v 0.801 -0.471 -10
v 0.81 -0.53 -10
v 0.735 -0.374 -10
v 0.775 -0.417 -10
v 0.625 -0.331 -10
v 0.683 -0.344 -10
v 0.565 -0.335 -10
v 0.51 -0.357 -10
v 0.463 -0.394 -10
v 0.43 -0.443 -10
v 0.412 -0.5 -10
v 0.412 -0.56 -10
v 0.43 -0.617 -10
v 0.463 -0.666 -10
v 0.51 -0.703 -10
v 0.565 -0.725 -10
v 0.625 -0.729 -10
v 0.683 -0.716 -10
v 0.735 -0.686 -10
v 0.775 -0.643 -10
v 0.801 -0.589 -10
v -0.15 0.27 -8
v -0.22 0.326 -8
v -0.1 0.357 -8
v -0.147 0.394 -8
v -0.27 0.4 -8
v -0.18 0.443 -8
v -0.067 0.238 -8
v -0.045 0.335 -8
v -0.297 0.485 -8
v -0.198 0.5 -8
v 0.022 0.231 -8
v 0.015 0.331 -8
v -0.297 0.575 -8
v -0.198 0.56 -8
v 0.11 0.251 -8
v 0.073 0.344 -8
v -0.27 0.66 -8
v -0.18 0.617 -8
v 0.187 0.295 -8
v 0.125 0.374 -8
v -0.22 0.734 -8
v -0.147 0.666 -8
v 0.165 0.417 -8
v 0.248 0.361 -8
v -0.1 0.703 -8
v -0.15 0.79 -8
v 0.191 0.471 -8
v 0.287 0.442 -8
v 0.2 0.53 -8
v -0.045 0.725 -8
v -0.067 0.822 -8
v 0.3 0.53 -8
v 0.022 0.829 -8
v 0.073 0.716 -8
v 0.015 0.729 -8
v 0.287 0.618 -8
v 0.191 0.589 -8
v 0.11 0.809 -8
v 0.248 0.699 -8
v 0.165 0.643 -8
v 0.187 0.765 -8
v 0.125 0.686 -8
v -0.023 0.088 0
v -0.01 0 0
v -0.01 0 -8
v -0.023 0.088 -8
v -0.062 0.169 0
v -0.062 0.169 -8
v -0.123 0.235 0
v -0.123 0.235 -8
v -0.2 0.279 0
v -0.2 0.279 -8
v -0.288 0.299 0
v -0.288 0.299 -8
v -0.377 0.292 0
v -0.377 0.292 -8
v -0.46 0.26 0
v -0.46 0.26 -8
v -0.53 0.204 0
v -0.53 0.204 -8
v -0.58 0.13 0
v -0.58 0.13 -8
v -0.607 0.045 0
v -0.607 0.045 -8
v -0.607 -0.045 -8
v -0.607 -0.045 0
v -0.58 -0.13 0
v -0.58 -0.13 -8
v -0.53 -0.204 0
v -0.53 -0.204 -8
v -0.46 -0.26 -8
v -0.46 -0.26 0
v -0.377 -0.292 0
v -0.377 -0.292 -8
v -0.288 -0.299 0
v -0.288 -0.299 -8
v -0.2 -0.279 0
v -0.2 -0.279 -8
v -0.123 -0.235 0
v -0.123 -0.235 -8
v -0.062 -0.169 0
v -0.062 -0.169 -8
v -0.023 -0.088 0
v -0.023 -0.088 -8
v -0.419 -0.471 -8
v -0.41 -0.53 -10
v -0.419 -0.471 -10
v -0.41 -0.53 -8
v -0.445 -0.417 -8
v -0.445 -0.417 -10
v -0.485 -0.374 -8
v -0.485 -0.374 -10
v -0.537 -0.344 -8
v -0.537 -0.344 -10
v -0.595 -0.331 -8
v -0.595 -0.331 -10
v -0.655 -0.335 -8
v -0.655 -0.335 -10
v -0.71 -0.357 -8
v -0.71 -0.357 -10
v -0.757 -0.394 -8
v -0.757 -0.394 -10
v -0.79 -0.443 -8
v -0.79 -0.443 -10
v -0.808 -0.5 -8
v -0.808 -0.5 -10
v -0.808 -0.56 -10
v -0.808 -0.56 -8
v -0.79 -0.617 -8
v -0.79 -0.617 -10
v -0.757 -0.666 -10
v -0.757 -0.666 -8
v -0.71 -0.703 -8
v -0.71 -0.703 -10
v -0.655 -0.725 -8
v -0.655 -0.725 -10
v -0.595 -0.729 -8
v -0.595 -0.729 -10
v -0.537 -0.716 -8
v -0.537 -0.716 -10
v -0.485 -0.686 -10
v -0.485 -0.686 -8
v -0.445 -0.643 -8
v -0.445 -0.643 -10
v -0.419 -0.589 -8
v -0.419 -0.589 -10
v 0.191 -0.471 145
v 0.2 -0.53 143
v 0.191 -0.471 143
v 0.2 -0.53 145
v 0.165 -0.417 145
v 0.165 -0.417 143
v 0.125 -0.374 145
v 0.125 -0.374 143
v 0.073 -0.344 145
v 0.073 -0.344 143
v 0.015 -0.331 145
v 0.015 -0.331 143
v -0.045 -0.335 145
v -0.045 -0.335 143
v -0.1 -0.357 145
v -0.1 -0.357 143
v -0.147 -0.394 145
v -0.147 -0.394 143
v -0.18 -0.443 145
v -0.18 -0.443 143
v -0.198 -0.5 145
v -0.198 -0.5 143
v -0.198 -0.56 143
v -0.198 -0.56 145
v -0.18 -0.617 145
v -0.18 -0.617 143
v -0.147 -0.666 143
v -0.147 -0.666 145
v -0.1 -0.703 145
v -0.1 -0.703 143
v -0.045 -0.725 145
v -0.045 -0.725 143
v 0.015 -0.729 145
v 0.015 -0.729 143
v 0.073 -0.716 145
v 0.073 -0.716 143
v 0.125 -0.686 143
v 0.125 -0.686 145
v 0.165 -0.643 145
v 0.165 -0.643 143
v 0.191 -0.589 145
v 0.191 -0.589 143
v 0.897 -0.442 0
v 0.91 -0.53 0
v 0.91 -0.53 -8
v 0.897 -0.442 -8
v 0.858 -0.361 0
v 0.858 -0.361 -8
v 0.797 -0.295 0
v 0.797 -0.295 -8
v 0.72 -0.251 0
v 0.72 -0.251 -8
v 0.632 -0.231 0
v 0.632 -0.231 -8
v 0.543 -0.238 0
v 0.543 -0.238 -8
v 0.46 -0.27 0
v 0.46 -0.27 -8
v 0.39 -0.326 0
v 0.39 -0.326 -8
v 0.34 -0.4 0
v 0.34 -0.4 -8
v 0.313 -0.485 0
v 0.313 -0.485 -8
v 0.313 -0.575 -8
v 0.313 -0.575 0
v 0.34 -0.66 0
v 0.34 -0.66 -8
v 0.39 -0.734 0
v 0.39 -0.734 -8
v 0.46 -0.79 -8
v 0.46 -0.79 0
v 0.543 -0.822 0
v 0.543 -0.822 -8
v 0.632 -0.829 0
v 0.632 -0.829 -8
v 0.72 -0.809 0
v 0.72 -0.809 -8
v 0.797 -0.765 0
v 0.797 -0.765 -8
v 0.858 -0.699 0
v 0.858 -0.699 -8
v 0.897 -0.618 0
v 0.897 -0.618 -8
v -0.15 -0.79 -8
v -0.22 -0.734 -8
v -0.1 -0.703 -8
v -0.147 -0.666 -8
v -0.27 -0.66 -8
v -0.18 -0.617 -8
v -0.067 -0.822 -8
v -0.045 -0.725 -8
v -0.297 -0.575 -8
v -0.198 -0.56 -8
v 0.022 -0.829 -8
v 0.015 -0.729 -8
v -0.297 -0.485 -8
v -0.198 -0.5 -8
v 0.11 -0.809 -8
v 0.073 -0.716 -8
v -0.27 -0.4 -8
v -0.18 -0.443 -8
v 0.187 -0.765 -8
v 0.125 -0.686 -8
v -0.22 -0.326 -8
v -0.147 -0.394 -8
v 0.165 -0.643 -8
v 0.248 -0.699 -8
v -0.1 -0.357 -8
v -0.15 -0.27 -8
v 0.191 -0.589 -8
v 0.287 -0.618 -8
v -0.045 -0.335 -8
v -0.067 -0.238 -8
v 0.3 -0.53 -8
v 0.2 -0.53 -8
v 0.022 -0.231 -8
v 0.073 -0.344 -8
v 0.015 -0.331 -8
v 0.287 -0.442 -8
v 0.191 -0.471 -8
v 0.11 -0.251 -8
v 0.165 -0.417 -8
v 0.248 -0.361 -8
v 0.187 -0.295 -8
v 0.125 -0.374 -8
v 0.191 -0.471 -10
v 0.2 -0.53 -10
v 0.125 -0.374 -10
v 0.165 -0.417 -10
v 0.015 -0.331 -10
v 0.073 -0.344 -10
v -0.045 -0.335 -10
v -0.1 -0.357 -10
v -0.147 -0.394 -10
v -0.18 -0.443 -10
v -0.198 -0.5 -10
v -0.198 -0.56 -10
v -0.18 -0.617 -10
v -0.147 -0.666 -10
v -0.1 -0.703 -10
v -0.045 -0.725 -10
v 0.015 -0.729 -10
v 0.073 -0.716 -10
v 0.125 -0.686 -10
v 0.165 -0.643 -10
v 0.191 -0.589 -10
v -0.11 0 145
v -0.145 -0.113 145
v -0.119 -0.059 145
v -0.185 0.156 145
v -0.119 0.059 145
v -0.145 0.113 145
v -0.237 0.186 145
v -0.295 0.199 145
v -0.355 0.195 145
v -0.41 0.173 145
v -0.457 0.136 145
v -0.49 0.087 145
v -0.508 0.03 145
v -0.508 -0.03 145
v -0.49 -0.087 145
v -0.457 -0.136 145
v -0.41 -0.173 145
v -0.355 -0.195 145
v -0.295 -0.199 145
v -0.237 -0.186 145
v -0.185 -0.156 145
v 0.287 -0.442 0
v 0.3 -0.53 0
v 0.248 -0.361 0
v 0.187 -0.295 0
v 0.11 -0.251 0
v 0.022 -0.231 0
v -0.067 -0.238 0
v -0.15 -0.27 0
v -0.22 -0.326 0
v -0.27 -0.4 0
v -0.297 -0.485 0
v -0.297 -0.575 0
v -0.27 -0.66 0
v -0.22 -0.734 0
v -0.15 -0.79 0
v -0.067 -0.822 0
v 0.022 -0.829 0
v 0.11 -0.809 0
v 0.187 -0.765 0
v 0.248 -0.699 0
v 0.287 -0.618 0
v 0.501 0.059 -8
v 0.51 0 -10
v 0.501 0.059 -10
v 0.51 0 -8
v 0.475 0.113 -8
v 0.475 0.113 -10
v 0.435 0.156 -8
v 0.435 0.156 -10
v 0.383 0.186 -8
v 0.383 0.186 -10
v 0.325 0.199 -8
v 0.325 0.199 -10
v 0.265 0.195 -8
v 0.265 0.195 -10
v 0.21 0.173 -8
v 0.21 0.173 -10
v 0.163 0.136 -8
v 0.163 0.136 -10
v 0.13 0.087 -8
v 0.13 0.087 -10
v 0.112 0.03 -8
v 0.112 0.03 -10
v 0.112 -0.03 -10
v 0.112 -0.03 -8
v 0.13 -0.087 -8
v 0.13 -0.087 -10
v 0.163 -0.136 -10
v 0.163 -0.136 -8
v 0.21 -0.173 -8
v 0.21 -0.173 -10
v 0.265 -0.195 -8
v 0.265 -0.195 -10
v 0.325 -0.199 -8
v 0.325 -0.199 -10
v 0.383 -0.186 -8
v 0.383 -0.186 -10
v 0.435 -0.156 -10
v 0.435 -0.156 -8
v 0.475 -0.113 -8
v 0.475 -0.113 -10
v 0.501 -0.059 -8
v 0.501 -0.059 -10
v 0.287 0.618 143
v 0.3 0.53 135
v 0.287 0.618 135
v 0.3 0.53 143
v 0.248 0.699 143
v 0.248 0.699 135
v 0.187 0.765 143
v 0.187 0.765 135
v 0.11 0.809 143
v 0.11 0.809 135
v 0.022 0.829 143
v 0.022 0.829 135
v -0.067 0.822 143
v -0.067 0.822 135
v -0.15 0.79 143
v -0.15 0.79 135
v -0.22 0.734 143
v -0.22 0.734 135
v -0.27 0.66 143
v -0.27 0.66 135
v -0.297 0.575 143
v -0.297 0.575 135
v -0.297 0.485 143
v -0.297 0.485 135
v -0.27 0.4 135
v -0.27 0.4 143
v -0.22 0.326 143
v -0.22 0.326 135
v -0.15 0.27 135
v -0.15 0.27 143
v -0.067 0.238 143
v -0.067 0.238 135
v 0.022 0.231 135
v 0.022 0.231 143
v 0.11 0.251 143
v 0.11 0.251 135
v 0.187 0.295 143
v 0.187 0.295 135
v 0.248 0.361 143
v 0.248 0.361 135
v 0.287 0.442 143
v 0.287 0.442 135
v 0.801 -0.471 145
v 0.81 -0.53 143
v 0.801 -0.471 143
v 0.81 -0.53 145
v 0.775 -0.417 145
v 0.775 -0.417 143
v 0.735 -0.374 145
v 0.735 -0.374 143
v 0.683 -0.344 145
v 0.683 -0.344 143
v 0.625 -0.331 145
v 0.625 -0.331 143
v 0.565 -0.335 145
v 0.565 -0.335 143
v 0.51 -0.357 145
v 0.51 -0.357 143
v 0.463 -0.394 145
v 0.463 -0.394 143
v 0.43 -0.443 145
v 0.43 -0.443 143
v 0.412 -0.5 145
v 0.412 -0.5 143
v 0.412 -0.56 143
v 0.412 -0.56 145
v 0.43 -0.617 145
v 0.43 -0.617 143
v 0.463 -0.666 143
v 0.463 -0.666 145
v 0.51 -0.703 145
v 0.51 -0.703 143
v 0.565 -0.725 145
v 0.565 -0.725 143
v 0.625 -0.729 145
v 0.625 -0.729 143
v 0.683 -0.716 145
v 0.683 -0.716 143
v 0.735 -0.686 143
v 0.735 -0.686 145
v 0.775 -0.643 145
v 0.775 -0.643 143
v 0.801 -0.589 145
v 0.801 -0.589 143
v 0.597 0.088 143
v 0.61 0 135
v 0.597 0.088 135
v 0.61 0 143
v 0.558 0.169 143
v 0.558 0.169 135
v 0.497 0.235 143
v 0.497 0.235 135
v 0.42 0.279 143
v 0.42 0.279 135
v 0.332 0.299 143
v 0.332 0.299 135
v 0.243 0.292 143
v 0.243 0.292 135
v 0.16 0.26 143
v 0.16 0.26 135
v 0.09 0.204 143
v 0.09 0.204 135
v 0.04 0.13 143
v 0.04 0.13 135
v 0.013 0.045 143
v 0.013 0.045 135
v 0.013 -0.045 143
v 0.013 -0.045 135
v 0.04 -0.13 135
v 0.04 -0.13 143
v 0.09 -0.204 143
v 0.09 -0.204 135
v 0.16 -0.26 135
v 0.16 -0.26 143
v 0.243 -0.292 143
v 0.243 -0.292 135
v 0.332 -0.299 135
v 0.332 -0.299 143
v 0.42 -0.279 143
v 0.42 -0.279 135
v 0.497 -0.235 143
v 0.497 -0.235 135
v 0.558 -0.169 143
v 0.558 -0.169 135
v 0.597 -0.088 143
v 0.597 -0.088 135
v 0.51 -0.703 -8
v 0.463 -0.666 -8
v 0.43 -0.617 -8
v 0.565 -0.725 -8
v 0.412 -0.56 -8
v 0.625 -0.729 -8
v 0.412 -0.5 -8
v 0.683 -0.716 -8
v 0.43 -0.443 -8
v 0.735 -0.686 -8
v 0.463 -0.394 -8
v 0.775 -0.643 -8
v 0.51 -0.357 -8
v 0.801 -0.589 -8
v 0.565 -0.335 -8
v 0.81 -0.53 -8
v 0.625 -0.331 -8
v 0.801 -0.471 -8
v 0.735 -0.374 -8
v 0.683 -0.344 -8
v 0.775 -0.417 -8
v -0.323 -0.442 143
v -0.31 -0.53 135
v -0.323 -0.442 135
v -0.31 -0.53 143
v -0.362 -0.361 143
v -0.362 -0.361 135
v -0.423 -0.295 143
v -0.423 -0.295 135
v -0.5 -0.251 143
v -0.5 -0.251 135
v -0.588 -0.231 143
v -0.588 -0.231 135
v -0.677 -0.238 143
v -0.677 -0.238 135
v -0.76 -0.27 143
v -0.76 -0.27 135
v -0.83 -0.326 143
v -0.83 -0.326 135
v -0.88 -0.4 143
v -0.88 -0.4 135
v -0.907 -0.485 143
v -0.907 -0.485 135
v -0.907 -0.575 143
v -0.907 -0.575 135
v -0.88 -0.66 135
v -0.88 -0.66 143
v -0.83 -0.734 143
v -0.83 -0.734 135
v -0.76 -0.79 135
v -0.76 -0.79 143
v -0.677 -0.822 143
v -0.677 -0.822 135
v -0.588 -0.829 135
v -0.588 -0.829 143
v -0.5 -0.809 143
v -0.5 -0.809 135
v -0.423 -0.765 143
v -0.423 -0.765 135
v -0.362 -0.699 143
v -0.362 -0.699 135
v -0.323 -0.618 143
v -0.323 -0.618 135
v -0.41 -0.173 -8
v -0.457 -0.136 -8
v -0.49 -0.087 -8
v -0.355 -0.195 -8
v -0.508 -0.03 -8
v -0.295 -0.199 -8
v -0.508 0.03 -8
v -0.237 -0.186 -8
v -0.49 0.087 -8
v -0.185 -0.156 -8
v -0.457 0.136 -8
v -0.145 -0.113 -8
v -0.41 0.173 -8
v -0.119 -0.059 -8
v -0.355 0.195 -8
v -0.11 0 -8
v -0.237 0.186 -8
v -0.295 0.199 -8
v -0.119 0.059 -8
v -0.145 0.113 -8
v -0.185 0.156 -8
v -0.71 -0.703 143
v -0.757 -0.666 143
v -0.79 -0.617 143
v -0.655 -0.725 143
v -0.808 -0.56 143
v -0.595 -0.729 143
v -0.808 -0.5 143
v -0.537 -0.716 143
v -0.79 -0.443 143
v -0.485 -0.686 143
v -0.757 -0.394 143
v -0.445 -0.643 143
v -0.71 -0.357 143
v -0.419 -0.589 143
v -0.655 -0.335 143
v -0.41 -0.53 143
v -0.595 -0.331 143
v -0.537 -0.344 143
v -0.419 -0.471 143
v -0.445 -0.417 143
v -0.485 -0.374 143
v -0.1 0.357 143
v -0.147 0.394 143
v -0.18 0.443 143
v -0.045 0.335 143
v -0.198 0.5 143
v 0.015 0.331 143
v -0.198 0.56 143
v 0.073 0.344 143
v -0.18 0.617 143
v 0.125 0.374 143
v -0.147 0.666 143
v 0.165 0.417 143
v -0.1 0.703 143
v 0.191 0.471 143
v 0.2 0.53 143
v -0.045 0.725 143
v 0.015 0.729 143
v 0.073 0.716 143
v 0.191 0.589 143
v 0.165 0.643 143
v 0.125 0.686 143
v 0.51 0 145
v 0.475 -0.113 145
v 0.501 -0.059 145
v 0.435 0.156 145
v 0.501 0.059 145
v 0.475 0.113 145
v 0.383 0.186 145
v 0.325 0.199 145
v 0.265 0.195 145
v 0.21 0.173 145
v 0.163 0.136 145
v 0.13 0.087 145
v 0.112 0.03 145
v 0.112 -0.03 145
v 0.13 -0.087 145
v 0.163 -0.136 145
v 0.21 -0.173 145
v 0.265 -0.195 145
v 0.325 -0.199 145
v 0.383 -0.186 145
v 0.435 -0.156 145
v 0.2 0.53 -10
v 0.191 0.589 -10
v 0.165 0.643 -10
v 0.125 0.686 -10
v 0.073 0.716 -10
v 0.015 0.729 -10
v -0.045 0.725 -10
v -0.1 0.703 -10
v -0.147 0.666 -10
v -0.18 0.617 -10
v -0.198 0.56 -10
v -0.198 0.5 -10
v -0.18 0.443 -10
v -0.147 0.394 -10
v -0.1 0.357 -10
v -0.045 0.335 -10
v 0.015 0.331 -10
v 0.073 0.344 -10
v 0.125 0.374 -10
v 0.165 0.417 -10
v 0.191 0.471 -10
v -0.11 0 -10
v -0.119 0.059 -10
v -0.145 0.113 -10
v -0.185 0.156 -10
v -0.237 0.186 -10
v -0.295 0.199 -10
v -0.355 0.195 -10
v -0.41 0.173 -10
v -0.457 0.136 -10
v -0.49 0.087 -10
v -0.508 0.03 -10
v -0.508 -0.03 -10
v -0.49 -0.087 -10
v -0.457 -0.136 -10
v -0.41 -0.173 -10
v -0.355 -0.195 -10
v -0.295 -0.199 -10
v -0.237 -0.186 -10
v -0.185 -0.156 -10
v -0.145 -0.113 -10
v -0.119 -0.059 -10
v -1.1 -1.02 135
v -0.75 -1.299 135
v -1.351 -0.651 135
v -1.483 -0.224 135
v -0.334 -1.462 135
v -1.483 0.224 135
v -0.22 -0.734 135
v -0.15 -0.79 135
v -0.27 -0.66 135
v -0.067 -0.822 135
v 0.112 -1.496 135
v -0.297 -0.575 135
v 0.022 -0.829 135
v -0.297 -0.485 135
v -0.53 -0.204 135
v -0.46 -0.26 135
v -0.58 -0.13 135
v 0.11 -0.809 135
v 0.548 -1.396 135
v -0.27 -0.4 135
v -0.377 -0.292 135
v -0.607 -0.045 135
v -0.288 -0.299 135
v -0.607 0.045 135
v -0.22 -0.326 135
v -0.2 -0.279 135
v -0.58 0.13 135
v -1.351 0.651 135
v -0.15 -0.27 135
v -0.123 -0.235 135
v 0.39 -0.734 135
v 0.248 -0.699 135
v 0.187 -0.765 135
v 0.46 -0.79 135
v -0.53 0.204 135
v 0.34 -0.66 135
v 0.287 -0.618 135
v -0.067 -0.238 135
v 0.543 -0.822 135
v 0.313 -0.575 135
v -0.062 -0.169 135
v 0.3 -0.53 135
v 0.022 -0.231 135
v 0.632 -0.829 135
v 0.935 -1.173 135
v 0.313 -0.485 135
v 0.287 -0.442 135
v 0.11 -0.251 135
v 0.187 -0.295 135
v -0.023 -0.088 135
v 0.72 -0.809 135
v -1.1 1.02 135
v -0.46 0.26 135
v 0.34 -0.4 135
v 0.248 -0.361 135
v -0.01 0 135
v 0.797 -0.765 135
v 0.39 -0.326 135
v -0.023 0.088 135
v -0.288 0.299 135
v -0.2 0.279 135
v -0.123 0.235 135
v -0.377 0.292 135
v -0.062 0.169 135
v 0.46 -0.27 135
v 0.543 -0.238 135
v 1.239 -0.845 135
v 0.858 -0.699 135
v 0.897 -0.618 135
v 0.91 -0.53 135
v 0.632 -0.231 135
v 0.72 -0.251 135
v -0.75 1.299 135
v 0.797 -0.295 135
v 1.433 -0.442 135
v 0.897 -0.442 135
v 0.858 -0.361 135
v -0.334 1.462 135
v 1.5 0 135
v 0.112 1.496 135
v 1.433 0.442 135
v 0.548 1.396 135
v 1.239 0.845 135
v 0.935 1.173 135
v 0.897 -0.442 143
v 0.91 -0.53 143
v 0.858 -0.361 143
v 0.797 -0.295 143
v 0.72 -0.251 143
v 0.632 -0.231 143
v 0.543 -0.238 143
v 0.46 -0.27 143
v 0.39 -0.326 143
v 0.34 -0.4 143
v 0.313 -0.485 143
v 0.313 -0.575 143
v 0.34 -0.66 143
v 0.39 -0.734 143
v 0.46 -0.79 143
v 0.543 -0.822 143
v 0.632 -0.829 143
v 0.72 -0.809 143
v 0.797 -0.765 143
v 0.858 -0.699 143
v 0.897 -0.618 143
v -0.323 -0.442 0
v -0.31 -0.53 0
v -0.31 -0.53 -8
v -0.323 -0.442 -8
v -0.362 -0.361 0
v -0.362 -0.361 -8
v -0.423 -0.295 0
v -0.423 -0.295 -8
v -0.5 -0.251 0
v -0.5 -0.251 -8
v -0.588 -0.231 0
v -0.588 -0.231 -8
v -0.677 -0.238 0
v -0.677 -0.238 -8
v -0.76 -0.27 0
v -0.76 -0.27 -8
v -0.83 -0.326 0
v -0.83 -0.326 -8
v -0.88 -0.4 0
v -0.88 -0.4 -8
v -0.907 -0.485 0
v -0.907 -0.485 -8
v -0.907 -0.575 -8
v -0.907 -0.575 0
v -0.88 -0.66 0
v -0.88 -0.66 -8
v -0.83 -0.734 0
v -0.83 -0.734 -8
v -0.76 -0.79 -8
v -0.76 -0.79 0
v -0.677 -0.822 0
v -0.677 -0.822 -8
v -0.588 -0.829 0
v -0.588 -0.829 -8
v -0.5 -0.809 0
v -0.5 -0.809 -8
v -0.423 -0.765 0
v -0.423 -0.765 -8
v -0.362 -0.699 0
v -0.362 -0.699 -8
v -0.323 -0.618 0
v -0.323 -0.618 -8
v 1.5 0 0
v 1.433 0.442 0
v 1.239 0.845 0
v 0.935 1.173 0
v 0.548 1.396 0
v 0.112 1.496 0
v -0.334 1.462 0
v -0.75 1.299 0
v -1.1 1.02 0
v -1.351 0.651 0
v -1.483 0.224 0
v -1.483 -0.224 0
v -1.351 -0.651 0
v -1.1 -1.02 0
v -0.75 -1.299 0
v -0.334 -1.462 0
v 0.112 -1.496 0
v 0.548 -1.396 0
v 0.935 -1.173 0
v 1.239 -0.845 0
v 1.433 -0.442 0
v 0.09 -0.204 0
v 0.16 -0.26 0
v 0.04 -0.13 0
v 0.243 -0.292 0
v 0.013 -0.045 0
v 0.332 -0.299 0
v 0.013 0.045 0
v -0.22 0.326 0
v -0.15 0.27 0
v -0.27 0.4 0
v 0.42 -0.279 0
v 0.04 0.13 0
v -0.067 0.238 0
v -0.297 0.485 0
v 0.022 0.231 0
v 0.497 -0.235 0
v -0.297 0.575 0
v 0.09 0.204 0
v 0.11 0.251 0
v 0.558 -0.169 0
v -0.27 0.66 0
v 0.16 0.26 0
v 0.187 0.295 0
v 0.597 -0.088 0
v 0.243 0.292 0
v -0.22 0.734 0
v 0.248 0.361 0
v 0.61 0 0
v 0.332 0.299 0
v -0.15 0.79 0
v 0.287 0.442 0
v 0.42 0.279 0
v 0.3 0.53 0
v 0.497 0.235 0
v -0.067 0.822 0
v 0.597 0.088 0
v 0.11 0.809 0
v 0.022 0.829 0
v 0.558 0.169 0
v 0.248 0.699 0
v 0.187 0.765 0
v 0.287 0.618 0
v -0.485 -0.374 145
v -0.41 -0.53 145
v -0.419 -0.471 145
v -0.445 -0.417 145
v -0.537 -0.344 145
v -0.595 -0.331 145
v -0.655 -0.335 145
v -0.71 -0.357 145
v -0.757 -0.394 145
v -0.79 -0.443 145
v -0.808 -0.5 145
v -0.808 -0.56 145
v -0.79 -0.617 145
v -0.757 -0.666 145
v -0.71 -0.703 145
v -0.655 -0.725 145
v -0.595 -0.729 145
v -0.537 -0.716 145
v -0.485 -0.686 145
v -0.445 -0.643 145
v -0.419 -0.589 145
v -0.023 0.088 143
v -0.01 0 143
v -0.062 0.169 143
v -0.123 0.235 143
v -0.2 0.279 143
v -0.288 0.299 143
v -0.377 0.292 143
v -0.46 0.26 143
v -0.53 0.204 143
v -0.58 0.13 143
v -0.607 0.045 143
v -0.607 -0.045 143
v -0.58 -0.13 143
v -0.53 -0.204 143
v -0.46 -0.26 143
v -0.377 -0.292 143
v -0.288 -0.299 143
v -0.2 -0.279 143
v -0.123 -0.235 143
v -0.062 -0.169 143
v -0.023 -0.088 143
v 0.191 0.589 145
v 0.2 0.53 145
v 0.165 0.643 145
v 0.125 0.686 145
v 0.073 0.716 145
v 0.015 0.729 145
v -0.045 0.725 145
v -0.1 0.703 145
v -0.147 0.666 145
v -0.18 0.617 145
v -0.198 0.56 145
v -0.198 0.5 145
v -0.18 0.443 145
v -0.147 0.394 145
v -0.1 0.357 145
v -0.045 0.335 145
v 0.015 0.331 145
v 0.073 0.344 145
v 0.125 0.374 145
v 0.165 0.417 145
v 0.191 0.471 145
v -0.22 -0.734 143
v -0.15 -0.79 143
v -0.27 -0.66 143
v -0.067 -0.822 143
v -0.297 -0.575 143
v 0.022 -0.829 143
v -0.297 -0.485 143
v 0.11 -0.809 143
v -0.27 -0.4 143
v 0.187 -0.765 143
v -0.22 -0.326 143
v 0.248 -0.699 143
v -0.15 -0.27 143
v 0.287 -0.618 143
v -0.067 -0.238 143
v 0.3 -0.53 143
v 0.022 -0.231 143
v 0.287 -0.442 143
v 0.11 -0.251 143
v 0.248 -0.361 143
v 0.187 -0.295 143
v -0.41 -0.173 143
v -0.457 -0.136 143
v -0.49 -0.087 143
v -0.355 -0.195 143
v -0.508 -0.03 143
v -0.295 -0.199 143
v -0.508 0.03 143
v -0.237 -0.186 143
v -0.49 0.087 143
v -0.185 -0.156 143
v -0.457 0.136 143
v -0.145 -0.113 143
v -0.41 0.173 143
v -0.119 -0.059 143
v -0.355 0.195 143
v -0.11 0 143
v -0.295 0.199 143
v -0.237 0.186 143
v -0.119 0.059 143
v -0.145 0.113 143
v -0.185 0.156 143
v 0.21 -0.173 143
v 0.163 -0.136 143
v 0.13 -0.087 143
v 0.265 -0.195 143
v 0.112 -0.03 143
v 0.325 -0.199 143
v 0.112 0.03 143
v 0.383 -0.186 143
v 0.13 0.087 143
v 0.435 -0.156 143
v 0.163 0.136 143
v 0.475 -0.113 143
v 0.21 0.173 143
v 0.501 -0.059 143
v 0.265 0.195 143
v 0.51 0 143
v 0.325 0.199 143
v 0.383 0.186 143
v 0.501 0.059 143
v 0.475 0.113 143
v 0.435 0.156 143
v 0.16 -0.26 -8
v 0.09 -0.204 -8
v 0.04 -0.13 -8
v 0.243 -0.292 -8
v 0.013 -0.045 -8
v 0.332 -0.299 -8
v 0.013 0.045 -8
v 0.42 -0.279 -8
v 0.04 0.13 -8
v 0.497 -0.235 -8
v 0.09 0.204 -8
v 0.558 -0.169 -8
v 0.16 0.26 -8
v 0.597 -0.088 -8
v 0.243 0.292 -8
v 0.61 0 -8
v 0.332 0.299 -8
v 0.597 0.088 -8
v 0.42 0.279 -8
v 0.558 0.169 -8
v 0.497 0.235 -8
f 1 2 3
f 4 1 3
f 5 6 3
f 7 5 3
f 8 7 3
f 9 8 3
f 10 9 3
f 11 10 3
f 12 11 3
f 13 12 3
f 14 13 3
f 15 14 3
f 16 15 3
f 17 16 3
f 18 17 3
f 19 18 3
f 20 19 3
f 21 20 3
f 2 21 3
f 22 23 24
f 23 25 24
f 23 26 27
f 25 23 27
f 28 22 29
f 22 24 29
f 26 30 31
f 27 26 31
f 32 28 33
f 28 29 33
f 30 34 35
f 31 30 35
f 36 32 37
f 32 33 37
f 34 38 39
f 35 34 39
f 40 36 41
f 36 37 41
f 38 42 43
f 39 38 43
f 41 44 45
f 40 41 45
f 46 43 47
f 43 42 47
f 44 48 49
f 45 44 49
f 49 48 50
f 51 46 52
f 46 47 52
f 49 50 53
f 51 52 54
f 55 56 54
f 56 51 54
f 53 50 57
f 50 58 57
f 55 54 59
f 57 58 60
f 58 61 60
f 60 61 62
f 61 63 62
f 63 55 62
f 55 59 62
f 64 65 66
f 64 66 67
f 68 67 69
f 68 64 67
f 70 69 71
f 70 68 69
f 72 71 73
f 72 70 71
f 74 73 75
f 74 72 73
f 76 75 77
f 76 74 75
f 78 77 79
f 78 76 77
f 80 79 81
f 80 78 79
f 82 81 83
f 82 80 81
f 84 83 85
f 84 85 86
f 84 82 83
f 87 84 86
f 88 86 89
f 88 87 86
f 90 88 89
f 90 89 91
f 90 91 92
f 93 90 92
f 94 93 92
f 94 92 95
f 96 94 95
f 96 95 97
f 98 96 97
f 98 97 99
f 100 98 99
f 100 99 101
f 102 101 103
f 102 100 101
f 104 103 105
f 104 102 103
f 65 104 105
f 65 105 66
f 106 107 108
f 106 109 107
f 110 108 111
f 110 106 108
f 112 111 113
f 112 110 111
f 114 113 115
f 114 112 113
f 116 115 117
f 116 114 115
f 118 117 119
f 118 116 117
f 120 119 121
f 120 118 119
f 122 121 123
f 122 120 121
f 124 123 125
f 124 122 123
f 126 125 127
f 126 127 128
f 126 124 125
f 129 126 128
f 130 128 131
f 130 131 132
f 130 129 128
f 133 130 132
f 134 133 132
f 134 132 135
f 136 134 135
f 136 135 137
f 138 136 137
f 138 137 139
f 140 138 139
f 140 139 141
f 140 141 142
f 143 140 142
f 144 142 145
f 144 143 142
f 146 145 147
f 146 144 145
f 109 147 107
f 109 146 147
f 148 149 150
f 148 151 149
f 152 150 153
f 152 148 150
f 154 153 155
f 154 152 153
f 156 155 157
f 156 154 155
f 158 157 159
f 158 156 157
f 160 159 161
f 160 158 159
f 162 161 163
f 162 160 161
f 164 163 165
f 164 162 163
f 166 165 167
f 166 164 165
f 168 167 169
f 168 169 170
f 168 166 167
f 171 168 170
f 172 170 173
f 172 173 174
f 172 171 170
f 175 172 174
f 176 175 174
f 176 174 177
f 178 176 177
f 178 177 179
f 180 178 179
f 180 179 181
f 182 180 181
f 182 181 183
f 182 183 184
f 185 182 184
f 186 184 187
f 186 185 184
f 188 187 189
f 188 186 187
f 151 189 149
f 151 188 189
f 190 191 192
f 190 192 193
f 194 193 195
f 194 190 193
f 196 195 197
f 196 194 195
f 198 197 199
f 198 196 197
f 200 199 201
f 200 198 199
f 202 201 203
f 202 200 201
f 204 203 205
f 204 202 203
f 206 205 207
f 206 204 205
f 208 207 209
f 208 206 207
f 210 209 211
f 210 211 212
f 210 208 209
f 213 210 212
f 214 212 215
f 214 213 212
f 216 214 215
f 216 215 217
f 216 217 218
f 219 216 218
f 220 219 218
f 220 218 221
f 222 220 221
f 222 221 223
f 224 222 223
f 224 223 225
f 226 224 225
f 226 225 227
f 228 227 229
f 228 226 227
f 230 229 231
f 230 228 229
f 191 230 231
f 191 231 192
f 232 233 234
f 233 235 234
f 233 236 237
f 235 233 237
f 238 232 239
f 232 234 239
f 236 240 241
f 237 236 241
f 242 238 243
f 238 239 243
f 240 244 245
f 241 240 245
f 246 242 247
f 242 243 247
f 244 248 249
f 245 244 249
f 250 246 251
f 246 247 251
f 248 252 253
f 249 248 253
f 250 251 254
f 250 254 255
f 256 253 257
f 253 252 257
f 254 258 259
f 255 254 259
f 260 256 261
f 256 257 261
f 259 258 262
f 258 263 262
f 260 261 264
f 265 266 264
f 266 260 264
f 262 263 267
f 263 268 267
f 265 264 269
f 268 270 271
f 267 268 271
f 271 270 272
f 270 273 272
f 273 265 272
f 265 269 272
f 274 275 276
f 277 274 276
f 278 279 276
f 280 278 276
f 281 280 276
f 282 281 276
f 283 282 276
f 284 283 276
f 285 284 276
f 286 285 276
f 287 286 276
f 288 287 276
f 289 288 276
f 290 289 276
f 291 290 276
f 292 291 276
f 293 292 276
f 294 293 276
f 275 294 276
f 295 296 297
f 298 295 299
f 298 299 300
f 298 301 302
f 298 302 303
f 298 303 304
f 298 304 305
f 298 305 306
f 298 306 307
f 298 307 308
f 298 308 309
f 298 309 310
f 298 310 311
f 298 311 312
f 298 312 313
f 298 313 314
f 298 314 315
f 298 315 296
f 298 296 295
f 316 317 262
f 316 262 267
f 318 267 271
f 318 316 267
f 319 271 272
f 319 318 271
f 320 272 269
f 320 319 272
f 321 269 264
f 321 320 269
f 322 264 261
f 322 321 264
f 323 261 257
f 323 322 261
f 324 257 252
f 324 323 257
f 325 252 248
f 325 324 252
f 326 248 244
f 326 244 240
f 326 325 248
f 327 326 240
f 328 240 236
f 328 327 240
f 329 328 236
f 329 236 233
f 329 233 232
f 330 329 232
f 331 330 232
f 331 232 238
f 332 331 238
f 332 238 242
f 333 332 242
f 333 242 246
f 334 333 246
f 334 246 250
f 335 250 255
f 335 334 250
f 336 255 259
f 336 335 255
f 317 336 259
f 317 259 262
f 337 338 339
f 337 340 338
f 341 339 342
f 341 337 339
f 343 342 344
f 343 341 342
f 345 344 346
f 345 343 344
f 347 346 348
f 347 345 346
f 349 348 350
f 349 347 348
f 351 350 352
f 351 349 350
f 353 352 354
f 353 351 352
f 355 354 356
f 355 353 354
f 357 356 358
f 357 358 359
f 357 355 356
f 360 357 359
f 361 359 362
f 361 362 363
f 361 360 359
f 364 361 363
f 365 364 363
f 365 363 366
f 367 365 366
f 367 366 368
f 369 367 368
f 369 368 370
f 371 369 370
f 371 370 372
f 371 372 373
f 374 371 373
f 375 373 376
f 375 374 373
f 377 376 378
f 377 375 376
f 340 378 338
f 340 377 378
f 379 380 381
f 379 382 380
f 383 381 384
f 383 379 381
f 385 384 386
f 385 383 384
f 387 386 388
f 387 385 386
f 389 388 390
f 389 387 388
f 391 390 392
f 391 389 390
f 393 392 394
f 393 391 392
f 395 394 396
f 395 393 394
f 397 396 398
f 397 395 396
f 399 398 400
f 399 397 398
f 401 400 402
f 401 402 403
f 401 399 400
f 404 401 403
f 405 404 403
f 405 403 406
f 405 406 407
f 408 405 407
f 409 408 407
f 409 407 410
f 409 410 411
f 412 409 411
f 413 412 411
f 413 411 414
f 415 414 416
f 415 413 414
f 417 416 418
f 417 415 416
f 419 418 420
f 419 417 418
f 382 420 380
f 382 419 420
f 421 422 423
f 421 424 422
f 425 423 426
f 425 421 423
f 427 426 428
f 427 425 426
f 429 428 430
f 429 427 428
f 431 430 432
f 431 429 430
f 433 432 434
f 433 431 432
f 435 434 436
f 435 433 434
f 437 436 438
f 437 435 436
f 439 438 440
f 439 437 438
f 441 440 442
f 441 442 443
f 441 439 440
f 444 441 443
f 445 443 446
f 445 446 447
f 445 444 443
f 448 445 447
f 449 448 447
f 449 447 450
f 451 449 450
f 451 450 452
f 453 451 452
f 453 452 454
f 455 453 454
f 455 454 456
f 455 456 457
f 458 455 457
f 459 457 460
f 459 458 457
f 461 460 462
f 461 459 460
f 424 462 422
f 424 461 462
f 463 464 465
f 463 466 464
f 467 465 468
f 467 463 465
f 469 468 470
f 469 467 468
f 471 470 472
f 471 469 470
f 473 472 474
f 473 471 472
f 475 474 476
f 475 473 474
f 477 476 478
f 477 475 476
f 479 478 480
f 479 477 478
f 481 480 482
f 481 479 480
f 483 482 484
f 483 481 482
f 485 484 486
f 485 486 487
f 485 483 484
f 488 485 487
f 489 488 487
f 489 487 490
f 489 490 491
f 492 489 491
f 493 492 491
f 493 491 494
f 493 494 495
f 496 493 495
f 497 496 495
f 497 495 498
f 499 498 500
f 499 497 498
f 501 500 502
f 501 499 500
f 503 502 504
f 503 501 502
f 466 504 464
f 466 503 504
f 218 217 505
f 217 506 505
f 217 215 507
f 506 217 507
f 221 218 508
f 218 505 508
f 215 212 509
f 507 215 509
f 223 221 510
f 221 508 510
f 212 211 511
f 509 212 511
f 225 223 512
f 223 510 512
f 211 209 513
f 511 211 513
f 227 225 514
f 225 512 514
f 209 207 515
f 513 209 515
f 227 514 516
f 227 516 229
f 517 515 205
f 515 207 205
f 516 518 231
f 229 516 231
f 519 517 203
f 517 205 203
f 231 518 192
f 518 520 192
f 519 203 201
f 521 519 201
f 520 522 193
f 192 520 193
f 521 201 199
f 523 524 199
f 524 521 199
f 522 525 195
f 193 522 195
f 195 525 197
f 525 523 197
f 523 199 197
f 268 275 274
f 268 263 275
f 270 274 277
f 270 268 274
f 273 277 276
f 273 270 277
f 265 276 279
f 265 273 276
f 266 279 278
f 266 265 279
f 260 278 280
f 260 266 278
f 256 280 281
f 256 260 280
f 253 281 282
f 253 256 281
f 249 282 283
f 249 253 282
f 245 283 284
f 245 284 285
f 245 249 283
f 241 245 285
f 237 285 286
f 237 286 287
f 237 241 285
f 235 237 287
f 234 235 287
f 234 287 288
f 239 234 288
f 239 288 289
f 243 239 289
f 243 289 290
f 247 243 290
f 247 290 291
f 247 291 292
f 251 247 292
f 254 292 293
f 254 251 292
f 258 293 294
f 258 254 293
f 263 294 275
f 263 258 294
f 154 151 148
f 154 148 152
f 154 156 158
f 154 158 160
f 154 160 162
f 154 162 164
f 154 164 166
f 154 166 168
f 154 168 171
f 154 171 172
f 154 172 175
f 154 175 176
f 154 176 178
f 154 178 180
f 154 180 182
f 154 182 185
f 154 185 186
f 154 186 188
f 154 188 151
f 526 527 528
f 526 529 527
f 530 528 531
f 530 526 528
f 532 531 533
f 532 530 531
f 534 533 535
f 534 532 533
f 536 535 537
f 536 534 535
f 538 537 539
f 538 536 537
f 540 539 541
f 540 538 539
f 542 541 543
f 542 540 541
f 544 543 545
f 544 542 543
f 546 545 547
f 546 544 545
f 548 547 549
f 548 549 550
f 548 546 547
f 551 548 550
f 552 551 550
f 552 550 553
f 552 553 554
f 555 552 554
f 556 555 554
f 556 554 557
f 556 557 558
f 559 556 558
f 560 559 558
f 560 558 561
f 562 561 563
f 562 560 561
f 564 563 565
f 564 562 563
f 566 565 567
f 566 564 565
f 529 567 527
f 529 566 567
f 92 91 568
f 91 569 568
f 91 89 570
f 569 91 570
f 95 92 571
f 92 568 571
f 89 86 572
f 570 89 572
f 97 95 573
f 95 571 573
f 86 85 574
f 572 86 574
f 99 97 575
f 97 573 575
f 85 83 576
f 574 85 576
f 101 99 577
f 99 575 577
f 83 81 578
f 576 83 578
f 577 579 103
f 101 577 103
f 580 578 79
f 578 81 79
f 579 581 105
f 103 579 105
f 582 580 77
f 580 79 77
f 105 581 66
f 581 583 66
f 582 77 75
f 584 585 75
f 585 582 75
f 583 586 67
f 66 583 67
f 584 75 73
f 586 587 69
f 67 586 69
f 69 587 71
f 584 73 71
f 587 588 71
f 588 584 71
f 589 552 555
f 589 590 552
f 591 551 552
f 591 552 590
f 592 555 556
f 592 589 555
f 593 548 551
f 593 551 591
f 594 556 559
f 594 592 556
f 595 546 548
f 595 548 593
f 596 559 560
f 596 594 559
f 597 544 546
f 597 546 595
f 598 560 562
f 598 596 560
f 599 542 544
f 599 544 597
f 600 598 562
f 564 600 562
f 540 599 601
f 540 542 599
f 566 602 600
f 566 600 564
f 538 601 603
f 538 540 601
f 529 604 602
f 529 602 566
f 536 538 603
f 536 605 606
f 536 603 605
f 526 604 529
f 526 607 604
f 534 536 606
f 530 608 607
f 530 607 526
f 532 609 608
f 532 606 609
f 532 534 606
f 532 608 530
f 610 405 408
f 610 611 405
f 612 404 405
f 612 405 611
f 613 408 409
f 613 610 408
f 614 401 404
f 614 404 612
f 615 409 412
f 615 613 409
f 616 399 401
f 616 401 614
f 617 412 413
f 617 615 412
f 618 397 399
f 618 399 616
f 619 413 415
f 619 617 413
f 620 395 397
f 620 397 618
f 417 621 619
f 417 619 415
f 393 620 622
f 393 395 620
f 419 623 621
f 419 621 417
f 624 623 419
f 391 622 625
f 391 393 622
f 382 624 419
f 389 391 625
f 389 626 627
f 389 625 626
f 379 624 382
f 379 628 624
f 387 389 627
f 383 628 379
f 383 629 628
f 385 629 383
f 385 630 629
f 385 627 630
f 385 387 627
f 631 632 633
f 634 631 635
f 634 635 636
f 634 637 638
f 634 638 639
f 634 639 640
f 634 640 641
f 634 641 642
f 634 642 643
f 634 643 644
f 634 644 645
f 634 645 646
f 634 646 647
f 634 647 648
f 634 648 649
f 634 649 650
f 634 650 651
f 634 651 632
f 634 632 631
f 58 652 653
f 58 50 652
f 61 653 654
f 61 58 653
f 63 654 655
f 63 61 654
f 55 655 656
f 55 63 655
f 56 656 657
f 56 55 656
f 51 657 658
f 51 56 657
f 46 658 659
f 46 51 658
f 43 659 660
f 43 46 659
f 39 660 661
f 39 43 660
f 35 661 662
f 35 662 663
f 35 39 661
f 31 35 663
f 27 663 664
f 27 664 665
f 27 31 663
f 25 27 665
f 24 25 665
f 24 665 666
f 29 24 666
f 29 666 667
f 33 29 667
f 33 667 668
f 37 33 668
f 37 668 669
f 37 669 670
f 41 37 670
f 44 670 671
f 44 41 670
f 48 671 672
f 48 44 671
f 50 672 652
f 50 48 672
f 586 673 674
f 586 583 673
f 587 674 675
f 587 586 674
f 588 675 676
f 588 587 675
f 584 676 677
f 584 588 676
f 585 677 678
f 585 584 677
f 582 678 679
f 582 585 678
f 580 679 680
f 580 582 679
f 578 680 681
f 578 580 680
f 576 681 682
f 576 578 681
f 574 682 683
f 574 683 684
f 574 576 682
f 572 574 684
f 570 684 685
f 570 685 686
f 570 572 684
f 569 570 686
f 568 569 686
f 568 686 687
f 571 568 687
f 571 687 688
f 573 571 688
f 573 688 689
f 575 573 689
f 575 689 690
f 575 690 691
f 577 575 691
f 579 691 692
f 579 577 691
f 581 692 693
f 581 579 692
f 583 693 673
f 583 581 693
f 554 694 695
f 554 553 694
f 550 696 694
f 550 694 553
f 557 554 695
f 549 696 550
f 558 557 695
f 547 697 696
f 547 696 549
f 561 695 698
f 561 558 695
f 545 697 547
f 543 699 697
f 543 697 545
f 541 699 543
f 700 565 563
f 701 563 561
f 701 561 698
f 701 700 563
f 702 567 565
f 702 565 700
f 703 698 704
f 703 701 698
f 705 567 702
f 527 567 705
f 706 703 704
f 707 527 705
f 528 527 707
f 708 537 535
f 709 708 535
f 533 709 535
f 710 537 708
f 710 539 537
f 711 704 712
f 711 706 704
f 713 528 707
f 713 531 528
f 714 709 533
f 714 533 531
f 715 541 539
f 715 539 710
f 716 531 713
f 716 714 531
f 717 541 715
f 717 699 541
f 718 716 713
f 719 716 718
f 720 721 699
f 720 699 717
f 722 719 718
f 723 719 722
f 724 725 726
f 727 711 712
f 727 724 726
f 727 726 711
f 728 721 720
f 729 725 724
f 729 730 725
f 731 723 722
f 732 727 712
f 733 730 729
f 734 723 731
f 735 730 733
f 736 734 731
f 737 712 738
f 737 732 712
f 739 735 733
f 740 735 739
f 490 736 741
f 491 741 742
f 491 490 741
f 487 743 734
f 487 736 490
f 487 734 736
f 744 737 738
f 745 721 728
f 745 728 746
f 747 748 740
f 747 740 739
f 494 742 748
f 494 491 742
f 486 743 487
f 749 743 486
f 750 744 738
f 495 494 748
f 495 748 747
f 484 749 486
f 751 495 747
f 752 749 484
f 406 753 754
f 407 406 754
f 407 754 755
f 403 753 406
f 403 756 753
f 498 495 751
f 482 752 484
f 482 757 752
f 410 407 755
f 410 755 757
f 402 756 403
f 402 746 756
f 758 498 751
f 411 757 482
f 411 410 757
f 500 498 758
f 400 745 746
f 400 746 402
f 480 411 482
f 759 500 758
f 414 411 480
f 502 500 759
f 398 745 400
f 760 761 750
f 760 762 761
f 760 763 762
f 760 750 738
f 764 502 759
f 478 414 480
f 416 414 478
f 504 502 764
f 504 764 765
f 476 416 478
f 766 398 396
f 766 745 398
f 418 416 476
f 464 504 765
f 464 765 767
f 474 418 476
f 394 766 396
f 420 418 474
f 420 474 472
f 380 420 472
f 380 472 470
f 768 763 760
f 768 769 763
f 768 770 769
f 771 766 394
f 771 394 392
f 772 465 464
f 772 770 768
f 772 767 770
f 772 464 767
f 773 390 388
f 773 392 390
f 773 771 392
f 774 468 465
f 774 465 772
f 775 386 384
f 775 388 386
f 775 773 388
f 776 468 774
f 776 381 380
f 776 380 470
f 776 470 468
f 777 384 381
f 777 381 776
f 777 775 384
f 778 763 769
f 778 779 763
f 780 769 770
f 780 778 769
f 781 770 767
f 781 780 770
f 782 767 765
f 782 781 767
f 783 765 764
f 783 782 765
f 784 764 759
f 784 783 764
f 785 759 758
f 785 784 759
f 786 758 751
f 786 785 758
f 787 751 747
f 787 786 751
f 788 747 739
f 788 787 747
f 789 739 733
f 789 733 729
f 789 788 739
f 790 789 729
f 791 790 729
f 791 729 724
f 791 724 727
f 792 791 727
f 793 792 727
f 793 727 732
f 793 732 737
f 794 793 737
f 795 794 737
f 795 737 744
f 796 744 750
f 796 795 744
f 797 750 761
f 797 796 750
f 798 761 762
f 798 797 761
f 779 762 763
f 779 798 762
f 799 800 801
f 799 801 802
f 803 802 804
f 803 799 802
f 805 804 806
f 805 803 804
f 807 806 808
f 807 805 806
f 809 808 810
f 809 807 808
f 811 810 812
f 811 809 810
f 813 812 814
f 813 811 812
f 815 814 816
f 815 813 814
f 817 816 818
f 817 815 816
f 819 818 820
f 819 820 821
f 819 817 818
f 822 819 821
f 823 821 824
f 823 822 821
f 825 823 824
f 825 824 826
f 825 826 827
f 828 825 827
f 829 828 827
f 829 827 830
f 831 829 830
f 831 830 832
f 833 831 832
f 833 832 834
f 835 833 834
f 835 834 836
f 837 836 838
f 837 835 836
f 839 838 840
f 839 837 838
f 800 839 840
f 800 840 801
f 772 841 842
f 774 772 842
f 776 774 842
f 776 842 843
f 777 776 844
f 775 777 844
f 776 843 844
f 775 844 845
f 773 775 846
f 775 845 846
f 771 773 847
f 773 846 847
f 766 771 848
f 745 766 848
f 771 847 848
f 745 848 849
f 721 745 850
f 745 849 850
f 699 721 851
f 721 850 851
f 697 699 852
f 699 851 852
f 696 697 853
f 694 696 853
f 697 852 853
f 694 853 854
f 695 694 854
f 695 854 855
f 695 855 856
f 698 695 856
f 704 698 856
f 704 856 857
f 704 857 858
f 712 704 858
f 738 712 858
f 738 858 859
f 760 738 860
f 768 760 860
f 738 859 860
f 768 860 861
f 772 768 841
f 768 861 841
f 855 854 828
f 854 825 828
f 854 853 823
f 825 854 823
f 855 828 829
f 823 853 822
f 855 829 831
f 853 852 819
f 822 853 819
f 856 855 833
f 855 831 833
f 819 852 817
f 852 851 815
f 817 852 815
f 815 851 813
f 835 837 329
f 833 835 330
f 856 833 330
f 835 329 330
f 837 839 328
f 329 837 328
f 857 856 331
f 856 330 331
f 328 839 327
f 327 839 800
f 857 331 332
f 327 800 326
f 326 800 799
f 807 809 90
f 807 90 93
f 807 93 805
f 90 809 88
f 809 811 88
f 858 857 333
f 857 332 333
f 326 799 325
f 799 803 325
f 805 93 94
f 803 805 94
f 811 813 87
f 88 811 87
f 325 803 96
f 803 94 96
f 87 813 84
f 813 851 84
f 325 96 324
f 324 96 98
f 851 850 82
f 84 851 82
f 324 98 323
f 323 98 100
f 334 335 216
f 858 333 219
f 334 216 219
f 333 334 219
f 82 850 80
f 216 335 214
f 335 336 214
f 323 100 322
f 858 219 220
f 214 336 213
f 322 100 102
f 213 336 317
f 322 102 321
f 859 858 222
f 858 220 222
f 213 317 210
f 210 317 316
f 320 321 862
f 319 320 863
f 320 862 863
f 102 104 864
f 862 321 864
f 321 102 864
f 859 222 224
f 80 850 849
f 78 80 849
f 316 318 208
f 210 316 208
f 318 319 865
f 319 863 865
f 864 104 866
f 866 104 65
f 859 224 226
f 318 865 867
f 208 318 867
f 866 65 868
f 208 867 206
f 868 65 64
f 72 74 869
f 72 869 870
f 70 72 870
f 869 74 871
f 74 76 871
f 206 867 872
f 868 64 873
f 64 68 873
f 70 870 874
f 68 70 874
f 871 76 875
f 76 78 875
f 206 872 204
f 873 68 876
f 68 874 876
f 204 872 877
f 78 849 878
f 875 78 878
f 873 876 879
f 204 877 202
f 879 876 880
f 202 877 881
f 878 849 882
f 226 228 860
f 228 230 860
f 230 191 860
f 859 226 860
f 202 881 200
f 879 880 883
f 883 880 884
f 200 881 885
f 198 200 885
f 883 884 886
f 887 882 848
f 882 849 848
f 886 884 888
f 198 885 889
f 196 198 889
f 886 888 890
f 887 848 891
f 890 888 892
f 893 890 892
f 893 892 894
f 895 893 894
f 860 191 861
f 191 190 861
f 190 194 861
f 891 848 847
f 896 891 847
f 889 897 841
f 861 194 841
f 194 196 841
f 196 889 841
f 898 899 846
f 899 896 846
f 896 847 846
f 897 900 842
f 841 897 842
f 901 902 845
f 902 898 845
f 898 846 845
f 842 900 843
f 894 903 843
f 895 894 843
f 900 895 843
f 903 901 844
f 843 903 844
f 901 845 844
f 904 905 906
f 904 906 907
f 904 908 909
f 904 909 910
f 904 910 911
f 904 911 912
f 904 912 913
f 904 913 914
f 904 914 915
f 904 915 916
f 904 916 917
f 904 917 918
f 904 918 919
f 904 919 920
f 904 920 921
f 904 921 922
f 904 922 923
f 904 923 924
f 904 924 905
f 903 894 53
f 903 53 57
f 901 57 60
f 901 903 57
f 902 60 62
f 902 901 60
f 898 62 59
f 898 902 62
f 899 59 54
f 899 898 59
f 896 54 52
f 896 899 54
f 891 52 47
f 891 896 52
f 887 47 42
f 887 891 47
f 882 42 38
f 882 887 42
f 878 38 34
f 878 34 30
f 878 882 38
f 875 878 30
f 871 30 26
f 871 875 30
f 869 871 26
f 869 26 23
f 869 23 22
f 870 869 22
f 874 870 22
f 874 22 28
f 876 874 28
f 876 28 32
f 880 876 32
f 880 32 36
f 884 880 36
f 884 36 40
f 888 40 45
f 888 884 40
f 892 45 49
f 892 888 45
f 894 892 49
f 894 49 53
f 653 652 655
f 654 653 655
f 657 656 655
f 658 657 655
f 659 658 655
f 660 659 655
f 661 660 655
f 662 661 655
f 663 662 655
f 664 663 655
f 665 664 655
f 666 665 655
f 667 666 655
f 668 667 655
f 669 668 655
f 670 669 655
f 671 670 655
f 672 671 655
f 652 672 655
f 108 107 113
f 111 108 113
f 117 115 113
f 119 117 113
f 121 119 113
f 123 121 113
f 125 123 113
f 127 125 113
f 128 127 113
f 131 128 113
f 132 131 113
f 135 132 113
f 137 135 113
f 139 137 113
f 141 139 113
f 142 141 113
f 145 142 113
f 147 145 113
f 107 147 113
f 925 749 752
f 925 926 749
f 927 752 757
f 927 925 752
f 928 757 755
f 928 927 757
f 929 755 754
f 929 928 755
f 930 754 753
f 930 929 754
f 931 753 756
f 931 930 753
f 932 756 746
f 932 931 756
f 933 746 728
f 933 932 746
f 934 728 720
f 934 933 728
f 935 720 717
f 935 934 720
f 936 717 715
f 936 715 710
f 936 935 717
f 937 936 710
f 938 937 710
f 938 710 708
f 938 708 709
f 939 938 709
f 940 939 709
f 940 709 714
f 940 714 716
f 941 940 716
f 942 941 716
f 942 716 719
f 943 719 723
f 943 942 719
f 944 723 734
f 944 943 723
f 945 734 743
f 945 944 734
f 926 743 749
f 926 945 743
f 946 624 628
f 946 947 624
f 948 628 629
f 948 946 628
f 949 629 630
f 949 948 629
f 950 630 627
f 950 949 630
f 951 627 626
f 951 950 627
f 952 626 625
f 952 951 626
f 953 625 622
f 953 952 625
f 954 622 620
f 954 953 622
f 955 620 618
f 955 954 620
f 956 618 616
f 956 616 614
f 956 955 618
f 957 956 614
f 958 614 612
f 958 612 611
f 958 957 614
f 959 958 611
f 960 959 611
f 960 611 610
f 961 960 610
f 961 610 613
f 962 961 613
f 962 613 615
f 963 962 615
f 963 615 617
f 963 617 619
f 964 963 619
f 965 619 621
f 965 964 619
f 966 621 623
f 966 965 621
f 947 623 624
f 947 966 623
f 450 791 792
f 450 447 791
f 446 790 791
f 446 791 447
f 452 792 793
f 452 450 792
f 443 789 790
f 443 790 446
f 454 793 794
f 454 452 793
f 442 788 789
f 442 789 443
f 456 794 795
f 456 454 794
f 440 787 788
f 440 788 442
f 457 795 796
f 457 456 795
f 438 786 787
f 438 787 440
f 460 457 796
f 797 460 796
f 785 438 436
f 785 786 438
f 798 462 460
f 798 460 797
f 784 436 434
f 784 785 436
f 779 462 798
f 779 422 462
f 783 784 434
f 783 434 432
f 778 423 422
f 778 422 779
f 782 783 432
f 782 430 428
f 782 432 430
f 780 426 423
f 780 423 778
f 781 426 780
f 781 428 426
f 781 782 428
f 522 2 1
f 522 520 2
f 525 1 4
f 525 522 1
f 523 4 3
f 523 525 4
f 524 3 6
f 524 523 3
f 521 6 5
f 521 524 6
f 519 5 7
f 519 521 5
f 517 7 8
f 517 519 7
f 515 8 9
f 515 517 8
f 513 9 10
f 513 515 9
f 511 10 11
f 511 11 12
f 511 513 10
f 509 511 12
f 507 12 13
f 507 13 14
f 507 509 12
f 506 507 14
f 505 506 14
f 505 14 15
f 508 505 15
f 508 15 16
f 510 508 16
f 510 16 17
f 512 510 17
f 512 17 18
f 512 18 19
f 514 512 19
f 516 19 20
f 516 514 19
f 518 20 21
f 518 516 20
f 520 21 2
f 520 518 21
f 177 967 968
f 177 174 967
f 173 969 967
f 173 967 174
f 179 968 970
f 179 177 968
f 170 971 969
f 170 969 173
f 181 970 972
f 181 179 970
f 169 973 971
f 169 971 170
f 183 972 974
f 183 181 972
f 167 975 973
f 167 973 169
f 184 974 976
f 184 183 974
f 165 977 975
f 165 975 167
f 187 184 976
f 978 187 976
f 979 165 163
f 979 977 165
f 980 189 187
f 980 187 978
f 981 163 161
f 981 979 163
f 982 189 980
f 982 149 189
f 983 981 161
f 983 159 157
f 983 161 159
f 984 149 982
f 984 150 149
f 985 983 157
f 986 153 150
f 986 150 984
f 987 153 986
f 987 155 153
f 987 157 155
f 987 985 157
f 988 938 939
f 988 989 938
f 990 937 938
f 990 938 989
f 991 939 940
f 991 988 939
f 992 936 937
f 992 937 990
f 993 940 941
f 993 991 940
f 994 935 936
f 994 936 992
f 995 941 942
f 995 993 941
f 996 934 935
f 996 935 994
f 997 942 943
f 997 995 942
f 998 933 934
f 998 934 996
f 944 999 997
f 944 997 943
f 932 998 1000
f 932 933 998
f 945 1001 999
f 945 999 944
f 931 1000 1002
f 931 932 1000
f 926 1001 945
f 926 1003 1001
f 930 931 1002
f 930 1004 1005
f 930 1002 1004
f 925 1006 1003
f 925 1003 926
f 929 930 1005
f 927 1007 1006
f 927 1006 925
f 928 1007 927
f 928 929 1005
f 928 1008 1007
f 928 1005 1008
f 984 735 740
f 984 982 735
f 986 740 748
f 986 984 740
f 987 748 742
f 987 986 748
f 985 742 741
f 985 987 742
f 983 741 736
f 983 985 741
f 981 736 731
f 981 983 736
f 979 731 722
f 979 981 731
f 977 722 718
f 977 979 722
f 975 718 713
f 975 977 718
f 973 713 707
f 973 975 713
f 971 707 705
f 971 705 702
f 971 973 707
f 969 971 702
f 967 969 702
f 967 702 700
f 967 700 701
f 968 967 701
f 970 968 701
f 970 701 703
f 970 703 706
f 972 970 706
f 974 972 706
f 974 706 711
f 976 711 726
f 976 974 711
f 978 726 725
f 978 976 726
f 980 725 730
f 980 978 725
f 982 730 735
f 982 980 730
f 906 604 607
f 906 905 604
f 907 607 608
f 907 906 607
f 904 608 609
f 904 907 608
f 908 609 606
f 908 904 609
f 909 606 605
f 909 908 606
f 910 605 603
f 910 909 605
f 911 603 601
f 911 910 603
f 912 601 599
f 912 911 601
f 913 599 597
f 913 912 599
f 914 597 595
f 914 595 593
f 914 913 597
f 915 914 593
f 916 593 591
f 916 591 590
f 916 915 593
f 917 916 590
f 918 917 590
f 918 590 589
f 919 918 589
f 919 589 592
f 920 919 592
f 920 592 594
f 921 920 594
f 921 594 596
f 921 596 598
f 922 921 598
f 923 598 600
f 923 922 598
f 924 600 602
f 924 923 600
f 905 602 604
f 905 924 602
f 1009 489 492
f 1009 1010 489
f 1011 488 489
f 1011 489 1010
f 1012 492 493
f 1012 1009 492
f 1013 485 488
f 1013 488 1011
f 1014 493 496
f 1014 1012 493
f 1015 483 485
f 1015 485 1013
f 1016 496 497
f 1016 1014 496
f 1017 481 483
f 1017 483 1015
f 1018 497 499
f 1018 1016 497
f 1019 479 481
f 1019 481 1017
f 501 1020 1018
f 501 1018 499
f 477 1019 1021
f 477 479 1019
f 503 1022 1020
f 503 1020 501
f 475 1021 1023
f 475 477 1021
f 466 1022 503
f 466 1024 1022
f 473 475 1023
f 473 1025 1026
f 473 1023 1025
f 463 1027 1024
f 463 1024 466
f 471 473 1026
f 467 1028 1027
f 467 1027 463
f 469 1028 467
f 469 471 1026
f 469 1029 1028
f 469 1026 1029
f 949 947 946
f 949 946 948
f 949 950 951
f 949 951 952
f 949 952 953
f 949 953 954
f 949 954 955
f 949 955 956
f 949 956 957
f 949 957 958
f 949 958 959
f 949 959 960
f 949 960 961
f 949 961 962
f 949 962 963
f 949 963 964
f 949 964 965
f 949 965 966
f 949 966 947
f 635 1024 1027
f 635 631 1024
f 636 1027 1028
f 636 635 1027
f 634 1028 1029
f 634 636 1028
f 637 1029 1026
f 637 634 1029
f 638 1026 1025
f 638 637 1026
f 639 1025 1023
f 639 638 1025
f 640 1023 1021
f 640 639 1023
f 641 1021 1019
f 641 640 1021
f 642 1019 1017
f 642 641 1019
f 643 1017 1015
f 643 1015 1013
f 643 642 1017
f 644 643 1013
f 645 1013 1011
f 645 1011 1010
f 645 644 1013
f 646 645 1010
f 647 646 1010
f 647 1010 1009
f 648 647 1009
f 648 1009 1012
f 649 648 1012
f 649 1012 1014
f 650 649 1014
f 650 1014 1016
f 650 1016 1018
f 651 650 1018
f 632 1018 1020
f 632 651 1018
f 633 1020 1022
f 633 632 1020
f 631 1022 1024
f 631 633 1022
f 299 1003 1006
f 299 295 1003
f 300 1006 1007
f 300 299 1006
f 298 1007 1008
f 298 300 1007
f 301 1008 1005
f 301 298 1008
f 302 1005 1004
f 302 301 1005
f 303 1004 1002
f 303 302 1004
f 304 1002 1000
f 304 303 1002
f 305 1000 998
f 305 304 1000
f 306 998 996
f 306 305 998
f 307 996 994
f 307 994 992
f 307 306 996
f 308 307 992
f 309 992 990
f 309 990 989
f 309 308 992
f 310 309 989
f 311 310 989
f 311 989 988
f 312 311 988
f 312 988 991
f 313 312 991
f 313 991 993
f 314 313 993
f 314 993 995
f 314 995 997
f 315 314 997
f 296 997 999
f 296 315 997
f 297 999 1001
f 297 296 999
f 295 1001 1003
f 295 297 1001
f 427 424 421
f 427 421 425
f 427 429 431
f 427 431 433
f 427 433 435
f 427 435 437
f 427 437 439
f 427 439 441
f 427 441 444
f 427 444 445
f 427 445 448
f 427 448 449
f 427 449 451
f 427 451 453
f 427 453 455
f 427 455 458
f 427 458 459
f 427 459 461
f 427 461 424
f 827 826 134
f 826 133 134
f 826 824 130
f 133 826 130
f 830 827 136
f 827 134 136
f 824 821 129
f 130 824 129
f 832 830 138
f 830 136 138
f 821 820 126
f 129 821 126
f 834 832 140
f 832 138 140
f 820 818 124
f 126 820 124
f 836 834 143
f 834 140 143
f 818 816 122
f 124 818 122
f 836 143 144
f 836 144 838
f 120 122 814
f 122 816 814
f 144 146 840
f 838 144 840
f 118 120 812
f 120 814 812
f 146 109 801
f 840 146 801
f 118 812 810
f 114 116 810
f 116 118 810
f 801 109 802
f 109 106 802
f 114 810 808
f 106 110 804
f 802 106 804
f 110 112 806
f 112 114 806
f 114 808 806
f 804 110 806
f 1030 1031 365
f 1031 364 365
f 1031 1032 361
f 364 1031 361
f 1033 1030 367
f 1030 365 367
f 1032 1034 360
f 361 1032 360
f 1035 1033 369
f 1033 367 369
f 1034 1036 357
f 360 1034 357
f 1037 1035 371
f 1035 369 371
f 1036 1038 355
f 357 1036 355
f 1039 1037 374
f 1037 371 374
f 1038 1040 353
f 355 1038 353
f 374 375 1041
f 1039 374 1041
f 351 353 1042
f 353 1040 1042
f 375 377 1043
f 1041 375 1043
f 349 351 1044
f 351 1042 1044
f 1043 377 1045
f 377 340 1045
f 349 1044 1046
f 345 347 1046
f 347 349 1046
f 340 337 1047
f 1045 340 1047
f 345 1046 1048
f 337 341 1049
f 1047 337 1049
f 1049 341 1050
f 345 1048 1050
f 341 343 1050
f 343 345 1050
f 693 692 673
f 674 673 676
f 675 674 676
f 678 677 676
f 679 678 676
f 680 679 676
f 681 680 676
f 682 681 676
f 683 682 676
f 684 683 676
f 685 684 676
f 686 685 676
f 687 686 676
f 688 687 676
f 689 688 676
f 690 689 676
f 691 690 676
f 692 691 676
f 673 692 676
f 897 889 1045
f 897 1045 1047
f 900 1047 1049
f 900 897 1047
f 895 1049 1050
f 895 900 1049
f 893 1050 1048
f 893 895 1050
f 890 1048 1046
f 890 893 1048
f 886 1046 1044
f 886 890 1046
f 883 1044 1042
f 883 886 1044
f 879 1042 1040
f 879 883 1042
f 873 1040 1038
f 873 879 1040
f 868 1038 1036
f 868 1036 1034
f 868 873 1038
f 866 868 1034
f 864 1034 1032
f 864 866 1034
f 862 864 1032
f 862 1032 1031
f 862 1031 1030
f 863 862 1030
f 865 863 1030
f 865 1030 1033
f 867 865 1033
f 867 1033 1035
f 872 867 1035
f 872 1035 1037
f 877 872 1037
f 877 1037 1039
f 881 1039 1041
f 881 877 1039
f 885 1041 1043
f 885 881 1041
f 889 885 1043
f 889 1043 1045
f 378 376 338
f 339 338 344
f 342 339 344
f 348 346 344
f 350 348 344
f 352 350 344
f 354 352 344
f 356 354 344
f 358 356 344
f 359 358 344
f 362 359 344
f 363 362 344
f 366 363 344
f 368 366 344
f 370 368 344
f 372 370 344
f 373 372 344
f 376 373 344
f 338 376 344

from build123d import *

# Parameters (mm, degrees)
SKETCH_1_R             = 0.2
EXTRUDE_9_DEPTH        = 145
EXTRUDE_9_DEPTH_BACK   = 10
EXTRUDE_9_2_DEPTH      = 145
EXTRUDE_9_2_DEPTH_BACK = 10
EXTRUDE_9_3_DEPTH      = 145
EXTRUDE_9_3_DEPTH_BACK = 10
EXTRUDE_9_4_DEPTH      = 145
EXTRUDE_9_4_DEPTH_BACK = 10
EXTRUDE_9_5_DEPTH      = 145
EXTRUDE_9_5_DEPTH_BACK = 10
EXTRUDE_9_6_DEPTH      = 145
EXTRUDE_9_6_DEPTH_BACK = 10
SKETCH_1_12_R          = 0.3
EXTRUDE_10_DEPTH       = 143
EXTRUDE_10_DEPTH_BACK  = 8
SKETCH_1_13_R          = 1.5
EXTRUDE_11_DEPTH       = 135


with BuildPart() as part:
    # Sketch 1 → Extrude 9 (new body, two sides)
    with BuildSketch(Plane.XY) as extrude_9_sk:
        with Locations((-0.31, 0)):
            Circle(SKETCH_1_R)
    extrude(amount=EXTRUDE_9_DEPTH)
    extrude(extrude_9_sk.sketch, amount=-EXTRUDE_9_DEPTH_BACK)



with BuildPart() as body_2:
    # Sketch 1 → Extrude 9 2 (new body, two sides)
    with BuildSketch(Plane.XY) as extrude_9_2_sk:
        with Locations((0, 0.53)):
            Circle(SKETCH_1_R)
    extrude(amount=EXTRUDE_9_2_DEPTH)
    extrude(extrude_9_2_sk.sketch, amount=-EXTRUDE_9_2_DEPTH_BACK)


with BuildPart() as body_3:
    # Sketch 1 → Extrude 9 3 (new body, two sides)
    with BuildSketch(Plane.XY) as extrude_9_3_sk:
        with Locations((0.31, 0)):
            Circle(SKETCH_1_R)
    extrude(amount=EXTRUDE_9_3_DEPTH)
    extrude(extrude_9_3_sk.sketch, amount=-EXTRUDE_9_3_DEPTH_BACK)


with BuildPart() as body_4:
    # Sketch 1 → Extrude 9 4 (new body, two sides)
    with BuildSketch(Plane.XY) as extrude_9_4_sk:
        with Locations((0, -0.53)):
            Circle(SKETCH_1_R)
    extrude(amount=EXTRUDE_9_4_DEPTH)
    extrude(extrude_9_4_sk.sketch, amount=-EXTRUDE_9_4_DEPTH_BACK)


with BuildPart() as body_5:
    # Sketch 1 → Extrude 9 5 (new body, two sides)
    with BuildSketch(Plane.XY) as extrude_9_5_sk:
        with Locations((-0.61, -0.53)):
            Circle(SKETCH_1_R)
    extrude(amount=EXTRUDE_9_5_DEPTH)
    extrude(extrude_9_5_sk.sketch, amount=-EXTRUDE_9_5_DEPTH_BACK)


with BuildPart() as body_6:
    # Sketch 1 → Extrude 9 6 (new body, two sides)
    with BuildSketch(Plane.XY) as extrude_9_6_sk:
        with Locations((0.61, -0.53)):
            Circle(SKETCH_1_R)
    extrude(amount=EXTRUDE_9_6_DEPTH)
    extrude(extrude_9_6_sk.sketch, amount=-EXTRUDE_9_6_DEPTH_BACK)


with BuildPart() as part_1:
    add(part.part)

    add(body_2.part)  # Extrude 10 merges body 2

    add(body_3.part)  # Extrude 10 merges body 3

    add(body_4.part)  # Extrude 10 merges body 4

    add(body_5.part)  # Extrude 10 merges body 5

    add(body_6.part)  # Extrude 10 merges body 6
    # Sketch 1_12 → Extrude 10 (add, two sides)
    with BuildSketch(Plane.XY) as extrude_10_sk:
        with Locations((0.31, 0)):
            Circle(SKETCH_1_12_R)
        with Locations((-0.31, 0)):
            Circle(SKETCH_1_12_R)
        with Locations((0, 0.53)):
            Circle(SKETCH_1_12_R)
        with Locations((0, -0.53)):
            Circle(SKETCH_1_12_R)
        with Locations((-0.61, -0.53)):
            Circle(SKETCH_1_12_R)
        with Locations((0.61, -0.53)):
            Circle(SKETCH_1_12_R)
    extrude(amount=EXTRUDE_10_DEPTH)
    extrude(extrude_10_sk.sketch, amount=-EXTRUDE_10_DEPTH_BACK)

    # Sketch 1_13 → Extrude 11 (add)
    with BuildSketch(Plane.XY):
        Circle(SKETCH_1_13_R)
    extrude(amount=EXTRUDE_11_DEPTH)


solid = part_1.part
